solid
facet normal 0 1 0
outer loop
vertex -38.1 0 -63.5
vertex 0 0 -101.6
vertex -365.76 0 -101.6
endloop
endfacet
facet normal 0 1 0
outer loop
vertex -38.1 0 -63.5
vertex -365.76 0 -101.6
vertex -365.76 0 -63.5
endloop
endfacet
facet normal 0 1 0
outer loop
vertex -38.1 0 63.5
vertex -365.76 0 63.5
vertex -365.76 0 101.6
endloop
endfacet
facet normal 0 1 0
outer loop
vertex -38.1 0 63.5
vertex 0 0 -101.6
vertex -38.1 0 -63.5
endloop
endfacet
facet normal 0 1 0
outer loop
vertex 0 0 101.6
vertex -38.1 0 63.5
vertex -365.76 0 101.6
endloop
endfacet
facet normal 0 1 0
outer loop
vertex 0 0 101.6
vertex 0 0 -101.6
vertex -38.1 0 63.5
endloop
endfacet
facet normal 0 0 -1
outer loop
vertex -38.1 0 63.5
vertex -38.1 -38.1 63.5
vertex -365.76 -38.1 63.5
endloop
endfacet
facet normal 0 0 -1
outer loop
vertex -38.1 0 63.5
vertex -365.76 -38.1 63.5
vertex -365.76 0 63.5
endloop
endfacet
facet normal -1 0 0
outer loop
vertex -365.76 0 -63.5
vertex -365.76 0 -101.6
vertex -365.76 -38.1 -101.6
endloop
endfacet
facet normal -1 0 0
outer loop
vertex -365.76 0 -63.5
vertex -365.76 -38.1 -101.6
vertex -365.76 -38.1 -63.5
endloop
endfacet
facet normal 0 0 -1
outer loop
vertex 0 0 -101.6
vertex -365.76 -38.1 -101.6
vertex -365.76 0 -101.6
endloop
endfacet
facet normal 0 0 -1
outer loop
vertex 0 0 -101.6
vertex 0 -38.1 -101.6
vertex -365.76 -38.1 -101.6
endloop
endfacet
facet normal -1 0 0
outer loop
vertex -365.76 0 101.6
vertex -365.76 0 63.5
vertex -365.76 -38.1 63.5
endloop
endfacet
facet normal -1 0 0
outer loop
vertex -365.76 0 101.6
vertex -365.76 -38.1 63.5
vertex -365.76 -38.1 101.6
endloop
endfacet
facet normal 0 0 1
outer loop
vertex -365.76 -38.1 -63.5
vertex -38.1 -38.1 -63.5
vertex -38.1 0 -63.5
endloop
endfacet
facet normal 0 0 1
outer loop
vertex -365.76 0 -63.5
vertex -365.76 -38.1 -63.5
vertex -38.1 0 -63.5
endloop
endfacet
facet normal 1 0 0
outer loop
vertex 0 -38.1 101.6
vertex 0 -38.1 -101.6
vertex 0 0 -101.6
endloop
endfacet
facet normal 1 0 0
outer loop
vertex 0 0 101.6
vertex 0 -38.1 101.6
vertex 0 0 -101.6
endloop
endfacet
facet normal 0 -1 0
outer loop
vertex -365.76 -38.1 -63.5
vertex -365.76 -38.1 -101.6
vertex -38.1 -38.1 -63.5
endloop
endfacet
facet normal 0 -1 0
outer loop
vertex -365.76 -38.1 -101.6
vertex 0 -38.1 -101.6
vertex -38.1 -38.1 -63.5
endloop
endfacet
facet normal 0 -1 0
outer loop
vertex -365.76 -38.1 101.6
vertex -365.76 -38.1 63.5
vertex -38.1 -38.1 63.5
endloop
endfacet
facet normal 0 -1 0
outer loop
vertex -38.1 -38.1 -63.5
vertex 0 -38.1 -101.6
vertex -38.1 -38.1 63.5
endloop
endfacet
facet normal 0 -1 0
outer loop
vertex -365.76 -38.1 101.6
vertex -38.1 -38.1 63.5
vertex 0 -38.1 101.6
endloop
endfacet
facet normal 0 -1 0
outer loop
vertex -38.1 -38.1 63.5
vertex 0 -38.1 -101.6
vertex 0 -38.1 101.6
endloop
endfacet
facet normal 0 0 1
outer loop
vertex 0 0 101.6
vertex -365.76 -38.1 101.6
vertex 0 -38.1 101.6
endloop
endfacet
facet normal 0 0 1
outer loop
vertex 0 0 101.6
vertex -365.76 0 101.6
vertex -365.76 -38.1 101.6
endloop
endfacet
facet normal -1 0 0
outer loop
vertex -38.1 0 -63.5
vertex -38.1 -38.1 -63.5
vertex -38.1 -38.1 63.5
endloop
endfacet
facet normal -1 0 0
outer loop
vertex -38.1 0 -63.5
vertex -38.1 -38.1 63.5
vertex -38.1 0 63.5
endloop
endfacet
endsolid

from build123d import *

# Parameters (mm, degrees)
BOSS_EXTRUDE1_DEPTH      = 101.6
BOSS_EXTRUDE1_DEPTH_BACK = 101.6
SKETCH1_W                = 38.1
SKETCH1_H                = 38.1
SKETCH2_W                = 38.1
SKETCH2_H                = 38.1
BOSS_EXTRUDE2_DEPTH      = 327.66000001


with BuildPart() as part:
    # Sketch1 → Boss-Extrude1 (new, two sides: drawn at the far end of the back side and taken through both)
    with BuildSketch(Plane.XY.offset(-BOSS_EXTRUDE1_DEPTH_BACK)):
        with Locations((-19.05, -19.05)):
            Rectangle(SKETCH1_W, SKETCH1_H)
    extrude(amount=BOSS_EXTRUDE1_DEPTH + BOSS_EXTRUDE1_DEPTH_BACK)

    # Sketch2 → Boss-Extrude2 (add)
    with BuildSketch(Plane.ZY.offset(38.1)):
        with Locations((-82.55, -19.05)):
            Rectangle(SKETCH2_W, SKETCH2_H)
        with Locations((82.55, -19.05)):
            Rectangle(SKETCH2_W, SKETCH2_H)
    extrude(amount=BOSS_EXTRUDE2_DEPTH)


solid = part.part
